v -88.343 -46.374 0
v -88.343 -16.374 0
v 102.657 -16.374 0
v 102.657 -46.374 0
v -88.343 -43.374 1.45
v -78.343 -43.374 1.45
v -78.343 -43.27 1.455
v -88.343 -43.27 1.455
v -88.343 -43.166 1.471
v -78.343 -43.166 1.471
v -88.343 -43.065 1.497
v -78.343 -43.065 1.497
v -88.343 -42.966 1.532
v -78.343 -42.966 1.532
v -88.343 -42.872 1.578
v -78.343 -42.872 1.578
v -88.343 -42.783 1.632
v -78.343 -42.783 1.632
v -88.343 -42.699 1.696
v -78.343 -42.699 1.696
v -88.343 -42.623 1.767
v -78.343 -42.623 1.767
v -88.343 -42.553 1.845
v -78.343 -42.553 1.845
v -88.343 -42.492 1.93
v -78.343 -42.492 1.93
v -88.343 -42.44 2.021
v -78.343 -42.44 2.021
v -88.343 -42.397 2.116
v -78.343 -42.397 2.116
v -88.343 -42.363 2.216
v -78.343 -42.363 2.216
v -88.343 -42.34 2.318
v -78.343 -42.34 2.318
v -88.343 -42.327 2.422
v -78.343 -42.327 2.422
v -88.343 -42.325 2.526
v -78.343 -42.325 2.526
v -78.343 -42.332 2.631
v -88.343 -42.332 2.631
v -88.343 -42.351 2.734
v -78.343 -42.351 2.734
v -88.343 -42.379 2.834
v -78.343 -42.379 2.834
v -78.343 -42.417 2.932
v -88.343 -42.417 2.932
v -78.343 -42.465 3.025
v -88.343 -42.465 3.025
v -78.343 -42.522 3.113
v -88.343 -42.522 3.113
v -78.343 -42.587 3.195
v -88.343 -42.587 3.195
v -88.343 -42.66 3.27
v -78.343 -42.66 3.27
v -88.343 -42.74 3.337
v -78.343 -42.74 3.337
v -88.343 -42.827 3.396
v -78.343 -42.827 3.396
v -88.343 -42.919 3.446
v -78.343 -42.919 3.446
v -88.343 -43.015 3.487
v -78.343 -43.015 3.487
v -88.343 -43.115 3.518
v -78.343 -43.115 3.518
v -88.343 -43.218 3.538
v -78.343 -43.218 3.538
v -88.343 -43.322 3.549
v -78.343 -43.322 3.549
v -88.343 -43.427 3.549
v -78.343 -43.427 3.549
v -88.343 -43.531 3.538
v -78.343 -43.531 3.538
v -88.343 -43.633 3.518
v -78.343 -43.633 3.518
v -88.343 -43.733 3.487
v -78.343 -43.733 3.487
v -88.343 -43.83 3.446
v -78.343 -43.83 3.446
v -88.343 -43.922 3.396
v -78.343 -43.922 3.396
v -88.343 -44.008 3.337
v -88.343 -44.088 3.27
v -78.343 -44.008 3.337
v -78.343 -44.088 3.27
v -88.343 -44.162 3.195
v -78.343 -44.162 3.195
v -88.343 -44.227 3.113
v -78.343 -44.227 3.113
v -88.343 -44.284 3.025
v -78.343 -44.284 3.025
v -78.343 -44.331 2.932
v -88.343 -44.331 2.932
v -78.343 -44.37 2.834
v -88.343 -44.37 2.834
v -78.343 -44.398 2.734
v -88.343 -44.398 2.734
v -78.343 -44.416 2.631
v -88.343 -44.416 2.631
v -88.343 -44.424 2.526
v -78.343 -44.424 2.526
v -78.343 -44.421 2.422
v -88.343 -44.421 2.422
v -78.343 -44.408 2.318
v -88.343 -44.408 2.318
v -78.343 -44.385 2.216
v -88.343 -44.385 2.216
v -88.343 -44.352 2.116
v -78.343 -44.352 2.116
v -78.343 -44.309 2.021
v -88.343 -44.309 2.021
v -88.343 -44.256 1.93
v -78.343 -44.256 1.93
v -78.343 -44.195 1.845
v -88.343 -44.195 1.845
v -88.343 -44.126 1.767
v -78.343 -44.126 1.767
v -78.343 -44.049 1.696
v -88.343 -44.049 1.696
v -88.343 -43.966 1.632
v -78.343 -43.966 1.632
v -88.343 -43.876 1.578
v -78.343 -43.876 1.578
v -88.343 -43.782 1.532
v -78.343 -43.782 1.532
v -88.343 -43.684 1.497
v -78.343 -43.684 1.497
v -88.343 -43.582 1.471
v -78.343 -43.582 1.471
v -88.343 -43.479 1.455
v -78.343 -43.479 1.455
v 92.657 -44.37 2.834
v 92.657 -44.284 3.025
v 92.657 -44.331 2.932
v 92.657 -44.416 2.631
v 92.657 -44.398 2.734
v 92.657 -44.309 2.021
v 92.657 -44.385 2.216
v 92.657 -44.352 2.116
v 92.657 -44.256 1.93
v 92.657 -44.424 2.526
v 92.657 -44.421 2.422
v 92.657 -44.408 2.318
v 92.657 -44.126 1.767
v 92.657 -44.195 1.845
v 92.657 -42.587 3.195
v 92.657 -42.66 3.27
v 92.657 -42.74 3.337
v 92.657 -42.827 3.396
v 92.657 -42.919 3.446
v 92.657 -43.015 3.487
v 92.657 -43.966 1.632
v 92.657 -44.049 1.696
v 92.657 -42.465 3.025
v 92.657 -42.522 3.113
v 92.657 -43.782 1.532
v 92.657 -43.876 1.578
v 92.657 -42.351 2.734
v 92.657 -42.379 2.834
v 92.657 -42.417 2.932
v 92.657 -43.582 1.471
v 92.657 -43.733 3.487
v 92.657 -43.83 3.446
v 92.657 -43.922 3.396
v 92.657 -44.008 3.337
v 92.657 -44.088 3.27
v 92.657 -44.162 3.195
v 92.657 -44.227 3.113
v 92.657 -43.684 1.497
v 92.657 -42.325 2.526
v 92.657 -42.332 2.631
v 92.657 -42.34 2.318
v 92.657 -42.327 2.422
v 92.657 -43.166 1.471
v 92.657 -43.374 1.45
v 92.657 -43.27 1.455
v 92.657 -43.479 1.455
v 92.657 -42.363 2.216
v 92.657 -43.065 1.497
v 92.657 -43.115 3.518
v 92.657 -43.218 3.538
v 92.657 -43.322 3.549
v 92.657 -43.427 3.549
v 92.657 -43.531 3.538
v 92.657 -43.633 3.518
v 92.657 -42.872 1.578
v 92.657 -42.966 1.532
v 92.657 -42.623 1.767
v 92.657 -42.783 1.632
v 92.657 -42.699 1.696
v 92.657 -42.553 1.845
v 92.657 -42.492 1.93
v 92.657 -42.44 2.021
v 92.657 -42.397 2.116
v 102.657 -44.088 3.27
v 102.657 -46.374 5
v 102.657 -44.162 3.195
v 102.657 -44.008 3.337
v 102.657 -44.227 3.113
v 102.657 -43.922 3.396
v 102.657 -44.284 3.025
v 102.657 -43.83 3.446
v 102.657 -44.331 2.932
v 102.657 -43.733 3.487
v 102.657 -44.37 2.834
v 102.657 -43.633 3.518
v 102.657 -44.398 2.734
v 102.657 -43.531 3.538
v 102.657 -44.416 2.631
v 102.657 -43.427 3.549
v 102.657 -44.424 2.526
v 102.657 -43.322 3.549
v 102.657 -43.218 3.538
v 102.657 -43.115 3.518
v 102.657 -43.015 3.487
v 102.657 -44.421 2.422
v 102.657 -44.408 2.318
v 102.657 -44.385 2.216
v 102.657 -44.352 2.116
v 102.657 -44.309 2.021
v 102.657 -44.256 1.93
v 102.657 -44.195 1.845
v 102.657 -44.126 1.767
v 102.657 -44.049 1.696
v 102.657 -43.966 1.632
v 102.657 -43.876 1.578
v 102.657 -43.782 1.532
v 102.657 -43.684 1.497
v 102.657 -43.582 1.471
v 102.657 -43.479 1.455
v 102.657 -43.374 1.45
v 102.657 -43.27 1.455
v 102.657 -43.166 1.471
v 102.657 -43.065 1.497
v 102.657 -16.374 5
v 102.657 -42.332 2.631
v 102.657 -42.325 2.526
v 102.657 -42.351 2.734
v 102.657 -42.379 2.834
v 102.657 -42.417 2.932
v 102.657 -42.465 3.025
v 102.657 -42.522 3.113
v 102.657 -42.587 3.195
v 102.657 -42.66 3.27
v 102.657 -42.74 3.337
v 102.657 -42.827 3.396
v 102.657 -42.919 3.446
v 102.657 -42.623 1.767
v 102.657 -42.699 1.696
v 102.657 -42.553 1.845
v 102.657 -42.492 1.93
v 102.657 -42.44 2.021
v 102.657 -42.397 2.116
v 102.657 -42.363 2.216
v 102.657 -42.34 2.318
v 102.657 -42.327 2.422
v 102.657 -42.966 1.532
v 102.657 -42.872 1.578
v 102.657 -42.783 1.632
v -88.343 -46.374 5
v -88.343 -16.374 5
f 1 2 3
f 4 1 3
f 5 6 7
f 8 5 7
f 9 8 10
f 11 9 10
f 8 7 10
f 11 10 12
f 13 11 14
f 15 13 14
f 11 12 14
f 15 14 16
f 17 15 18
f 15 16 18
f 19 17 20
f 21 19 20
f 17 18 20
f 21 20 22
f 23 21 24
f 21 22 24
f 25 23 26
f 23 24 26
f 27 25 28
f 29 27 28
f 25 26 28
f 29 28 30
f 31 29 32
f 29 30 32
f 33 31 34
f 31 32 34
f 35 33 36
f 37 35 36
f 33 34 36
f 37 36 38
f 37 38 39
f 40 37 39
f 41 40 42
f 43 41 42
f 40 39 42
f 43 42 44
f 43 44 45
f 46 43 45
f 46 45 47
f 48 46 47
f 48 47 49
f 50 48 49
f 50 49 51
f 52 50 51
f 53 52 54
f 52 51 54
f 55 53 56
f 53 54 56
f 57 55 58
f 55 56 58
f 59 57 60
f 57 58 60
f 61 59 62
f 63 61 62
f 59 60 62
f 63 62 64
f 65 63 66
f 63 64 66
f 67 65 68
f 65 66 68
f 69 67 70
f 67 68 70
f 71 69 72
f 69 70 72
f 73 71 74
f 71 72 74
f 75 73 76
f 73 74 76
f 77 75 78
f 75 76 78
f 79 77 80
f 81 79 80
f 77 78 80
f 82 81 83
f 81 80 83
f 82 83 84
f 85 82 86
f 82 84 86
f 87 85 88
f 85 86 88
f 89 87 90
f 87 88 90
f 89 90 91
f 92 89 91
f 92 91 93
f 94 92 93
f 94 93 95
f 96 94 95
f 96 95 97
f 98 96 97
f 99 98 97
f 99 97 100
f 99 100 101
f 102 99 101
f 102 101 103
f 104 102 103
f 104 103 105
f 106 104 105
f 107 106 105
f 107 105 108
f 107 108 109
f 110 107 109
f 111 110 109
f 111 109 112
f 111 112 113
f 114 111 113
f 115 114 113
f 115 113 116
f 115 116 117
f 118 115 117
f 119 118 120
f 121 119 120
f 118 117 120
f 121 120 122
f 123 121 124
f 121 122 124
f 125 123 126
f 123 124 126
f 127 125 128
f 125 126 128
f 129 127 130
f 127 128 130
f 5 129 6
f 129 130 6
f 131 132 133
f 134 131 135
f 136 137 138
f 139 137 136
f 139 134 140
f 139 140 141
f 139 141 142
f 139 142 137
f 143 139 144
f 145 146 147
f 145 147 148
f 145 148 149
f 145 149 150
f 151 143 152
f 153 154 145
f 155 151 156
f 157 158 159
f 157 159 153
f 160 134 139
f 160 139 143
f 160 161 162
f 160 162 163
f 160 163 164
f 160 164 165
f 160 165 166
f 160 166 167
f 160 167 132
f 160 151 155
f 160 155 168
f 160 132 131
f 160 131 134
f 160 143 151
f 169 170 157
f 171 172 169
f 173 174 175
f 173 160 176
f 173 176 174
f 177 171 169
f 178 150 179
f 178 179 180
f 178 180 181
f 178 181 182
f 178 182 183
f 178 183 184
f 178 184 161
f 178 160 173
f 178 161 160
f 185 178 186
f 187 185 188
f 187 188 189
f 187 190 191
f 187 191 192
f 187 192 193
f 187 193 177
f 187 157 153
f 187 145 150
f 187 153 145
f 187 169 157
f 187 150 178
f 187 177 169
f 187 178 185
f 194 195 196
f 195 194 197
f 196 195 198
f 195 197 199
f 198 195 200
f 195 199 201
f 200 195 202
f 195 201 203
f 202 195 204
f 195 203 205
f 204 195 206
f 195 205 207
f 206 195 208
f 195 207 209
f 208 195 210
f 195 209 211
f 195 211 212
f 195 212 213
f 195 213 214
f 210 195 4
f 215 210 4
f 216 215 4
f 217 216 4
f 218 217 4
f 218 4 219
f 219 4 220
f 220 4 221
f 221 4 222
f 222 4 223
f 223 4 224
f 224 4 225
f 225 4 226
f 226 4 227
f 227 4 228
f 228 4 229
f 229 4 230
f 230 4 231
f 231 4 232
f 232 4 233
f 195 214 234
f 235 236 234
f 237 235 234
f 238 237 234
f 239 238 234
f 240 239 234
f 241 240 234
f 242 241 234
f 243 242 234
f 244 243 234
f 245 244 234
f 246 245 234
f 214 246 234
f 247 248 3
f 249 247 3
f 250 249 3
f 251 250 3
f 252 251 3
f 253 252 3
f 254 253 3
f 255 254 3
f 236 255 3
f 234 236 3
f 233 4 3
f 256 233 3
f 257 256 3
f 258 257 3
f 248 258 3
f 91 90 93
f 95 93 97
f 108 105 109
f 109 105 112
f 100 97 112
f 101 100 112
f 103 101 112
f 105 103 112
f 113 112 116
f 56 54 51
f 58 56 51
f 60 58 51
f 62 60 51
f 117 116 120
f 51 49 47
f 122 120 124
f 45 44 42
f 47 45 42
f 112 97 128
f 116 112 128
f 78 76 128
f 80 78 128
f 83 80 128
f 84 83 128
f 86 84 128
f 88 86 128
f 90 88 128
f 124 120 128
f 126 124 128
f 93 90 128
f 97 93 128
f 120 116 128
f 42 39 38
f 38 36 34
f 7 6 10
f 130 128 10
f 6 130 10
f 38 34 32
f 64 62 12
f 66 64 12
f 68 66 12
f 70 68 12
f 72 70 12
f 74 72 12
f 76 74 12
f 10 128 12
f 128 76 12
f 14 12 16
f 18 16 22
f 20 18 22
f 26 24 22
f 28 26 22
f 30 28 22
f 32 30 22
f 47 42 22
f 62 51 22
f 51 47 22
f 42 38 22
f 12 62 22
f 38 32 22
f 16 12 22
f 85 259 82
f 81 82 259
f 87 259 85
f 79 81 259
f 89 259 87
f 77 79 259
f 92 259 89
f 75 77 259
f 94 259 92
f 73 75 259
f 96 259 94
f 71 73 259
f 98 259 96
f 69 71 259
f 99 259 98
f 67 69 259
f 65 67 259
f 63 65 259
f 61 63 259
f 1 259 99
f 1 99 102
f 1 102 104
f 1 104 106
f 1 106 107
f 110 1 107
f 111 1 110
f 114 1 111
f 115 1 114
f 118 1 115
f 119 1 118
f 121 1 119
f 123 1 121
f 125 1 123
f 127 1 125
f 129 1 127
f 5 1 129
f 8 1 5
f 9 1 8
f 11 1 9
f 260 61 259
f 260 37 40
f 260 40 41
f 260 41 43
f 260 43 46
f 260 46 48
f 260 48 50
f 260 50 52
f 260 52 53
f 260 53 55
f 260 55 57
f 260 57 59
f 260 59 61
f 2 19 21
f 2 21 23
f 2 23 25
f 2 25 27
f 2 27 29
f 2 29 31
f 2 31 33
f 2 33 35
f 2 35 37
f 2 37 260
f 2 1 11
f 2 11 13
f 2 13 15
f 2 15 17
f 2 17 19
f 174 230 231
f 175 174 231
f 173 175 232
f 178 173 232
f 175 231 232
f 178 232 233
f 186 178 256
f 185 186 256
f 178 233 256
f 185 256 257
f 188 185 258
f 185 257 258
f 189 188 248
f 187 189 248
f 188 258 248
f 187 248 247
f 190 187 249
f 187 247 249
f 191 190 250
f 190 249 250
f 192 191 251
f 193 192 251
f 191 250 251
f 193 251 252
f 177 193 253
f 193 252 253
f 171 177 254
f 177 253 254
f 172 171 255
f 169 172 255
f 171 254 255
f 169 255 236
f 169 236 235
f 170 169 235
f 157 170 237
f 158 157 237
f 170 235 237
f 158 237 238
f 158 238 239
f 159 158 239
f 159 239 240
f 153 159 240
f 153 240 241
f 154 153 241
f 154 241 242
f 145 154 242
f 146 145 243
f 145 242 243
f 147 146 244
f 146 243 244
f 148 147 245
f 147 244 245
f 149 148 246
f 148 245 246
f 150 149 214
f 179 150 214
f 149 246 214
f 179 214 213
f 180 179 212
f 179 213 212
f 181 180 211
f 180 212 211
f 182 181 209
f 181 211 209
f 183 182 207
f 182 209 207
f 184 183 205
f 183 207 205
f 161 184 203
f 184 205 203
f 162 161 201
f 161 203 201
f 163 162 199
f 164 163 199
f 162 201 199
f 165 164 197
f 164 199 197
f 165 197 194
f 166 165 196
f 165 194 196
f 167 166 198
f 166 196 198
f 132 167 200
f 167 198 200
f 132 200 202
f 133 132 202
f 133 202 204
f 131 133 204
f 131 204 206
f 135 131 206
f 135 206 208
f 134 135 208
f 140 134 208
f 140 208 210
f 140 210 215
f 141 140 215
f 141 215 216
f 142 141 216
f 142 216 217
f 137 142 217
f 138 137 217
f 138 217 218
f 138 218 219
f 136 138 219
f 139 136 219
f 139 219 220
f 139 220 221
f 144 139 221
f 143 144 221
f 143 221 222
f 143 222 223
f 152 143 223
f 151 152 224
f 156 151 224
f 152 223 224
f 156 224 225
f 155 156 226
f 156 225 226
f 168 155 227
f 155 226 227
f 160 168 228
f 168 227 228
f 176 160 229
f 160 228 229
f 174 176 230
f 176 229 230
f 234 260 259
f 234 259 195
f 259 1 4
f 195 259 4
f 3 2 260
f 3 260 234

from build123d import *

# Parameters (mm, degrees)
ESQUISSE1_W                = 191
ESQUISSE1_H                = 30
BOSS_EXTRU_1_DEPTH         = 5
ESQUISSE3_R                = 1.05
ENL_V_MAT_EXTRU_5_DEPTH    = 10
R_P_TITION_LIN_AIRE1_COUNT = 2
R_P_TITION_LIN_AIRE1_PITCH = 181


with BuildPart() as part:
    # Esquisse1 → Boss.-Extru.1 (new body)
    with BuildSketch(Plane.XY):
        with Locations((7.157177791, -31.374242424)):
            Rectangle(ESQUISSE1_W, ESQUISSE1_H)
    extrude(amount=BOSS_EXTRU_1_DEPTH)

    # Esquisse3 → Enlèv. mat.-Extru.5 (cut)
    with BuildSketch(Plane(origin=(102.657177791, 0, 0), x_dir=(0, 0, -1), z_dir=(1, 0, 0))):
        with Locations((-2.5, -43.374242424)):
            Circle(ESQUISSE3_R)
    enl_v_mat_extru_5 = extrude(amount=-ENL_V_MAT_EXTRU_5_DEPTH, mode=Mode.SUBTRACT)

    # Répétition linéaire1: Enlèv. mat.-Extru.5 ×2
    with Locations(*[(-i * R_P_TITION_LIN_AIRE1_PITCH, 0, 0) for i in range(1, R_P_TITION_LIN_AIRE1_COUNT)]):
        add(enl_v_mat_extru_5, mode=Mode.SUBTRACT)


solid = part.part
